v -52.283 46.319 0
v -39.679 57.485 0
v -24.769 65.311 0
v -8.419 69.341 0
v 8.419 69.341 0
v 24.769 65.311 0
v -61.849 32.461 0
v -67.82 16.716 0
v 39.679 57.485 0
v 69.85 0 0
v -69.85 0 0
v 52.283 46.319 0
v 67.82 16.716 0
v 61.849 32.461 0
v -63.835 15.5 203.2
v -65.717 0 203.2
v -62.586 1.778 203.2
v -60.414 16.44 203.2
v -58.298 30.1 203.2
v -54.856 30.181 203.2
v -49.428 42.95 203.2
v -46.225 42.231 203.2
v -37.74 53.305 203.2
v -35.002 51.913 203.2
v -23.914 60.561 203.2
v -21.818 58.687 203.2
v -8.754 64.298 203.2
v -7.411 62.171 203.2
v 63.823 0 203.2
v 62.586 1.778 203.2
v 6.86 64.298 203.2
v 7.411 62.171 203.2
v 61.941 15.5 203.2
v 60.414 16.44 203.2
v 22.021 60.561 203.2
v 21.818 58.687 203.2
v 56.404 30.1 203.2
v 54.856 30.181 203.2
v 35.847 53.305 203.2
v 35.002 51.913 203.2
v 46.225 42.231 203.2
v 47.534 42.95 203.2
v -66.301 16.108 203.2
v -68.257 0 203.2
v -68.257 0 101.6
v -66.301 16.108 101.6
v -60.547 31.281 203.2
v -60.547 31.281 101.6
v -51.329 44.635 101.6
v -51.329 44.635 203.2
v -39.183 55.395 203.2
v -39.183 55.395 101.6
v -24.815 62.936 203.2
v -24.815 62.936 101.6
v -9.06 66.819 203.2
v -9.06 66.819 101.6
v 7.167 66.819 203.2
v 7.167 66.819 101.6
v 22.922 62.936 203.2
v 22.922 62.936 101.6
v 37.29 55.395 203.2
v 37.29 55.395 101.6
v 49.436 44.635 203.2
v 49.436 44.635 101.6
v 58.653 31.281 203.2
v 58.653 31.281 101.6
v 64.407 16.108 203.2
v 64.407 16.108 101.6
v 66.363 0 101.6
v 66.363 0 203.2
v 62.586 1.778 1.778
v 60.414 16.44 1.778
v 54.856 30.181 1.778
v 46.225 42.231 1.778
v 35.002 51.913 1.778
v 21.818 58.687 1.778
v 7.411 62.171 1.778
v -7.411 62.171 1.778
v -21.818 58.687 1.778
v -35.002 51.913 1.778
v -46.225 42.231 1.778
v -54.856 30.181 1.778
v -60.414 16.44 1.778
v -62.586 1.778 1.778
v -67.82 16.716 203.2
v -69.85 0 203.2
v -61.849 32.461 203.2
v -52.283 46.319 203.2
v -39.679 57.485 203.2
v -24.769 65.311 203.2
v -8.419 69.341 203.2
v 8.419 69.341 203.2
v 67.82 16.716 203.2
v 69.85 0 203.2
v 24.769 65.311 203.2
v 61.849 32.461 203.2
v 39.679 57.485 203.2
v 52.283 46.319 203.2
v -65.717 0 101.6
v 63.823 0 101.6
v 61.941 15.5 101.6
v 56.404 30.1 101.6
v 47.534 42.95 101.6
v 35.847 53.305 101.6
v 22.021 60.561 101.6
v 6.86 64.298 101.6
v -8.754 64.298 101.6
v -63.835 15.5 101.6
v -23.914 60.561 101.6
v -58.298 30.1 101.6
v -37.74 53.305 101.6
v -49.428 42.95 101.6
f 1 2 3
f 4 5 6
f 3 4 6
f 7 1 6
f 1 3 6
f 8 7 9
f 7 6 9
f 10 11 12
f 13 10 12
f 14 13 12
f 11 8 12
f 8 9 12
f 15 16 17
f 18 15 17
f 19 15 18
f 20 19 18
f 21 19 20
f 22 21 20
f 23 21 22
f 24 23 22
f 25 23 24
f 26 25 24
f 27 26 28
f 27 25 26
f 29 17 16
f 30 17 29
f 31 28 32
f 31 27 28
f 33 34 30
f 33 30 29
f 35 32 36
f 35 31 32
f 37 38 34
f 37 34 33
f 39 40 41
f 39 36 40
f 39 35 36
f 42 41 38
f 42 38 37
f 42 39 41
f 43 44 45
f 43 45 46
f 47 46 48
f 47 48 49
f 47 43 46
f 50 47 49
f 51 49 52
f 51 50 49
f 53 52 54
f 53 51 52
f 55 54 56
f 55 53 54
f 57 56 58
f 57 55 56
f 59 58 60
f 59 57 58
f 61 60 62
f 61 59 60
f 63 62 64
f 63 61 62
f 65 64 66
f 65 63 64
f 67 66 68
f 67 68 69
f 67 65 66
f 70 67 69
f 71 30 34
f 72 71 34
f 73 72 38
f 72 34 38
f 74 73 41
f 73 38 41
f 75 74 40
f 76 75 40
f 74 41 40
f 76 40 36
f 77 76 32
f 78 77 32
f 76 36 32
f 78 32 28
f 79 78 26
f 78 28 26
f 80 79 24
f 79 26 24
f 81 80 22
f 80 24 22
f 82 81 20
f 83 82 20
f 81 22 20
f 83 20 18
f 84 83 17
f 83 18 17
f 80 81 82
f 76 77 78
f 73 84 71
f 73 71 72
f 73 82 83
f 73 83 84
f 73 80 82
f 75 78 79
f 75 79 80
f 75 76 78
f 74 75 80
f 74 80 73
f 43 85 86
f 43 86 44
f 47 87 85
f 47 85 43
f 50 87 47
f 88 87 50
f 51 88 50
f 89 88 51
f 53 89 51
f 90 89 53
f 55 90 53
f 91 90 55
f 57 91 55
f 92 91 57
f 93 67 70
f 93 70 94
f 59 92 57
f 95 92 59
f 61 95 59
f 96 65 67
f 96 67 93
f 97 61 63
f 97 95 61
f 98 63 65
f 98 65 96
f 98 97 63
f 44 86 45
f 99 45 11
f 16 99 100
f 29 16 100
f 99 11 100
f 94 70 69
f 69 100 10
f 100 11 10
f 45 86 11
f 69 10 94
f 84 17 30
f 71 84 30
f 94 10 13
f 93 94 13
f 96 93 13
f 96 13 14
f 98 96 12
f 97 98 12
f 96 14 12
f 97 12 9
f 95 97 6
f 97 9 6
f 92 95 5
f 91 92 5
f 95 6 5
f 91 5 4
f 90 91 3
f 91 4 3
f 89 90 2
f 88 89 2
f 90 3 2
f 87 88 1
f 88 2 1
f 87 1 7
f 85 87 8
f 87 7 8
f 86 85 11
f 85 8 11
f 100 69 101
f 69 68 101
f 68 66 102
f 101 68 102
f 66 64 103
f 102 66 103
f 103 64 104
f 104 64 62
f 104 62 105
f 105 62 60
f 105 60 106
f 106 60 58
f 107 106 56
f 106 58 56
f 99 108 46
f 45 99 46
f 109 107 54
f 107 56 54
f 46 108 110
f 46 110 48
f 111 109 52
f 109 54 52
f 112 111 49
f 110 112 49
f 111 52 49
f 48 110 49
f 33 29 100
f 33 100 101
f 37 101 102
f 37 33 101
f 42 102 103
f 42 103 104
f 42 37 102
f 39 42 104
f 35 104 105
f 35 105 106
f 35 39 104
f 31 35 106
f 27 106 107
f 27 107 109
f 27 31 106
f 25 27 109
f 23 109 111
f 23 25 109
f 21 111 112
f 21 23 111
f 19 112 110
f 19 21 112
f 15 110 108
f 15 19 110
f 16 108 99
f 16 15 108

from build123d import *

# Parameters (mm, degrees)
BOSS_EXTRUDE1_DEPTH = 203.2
CUT_EXTRUDE1_DEPTH  = 201.422
CUT_EXTRUDE2_DEPTH  = 101.6


with BuildPart() as part:
    # Sketch2 → Boss-Extrude1 (new body)
    with BuildSketch(Plane.XY):
        with BuildLine():
            Line((-69.85, 0), (69.85, 0))
            ThreePointArc((69.85, 0), (0, 69.85), (-69.85, 0))
        make_face()
    extrude(amount=BOSS_EXTRUDE1_DEPTH)

    # Sketch3 → Cut-Extrude1 (cut)
    with BuildSketch(Plane.XY.offset(203.2)):
        with BuildLine():
            Line((-62.585749472, 1.778), (62.585749472, 1.778))
            ThreePointArc((62.585749472, 1.778), (0, 62.611), (-62.585749472, 1.778))
        make_face()
    extrude(amount=-CUT_EXTRUDE1_DEPTH, mode=Mode.SUBTRACT)

    # Sketch5 → Cut-Extrude2 (cut)
    with BuildSketch(Plane.XY.offset(203.2)):
        with BuildLine():
            Line((66.363298263, 0), (63.823298263, 0))
            ThreePointArc((63.823298263, 0), (-0.946701737, 64.77), (-65.716701737, 0))
            Line((-65.716701737, 0), (-68.256701737, 0))
            ThreePointArc((-68.256701737, 0), (-0.946701737, 67.31), (66.363298263, 0))
        make_face()
    extrude(amount=-CUT_EXTRUDE2_DEPTH, mode=Mode.SUBTRACT)


solid = part.part
